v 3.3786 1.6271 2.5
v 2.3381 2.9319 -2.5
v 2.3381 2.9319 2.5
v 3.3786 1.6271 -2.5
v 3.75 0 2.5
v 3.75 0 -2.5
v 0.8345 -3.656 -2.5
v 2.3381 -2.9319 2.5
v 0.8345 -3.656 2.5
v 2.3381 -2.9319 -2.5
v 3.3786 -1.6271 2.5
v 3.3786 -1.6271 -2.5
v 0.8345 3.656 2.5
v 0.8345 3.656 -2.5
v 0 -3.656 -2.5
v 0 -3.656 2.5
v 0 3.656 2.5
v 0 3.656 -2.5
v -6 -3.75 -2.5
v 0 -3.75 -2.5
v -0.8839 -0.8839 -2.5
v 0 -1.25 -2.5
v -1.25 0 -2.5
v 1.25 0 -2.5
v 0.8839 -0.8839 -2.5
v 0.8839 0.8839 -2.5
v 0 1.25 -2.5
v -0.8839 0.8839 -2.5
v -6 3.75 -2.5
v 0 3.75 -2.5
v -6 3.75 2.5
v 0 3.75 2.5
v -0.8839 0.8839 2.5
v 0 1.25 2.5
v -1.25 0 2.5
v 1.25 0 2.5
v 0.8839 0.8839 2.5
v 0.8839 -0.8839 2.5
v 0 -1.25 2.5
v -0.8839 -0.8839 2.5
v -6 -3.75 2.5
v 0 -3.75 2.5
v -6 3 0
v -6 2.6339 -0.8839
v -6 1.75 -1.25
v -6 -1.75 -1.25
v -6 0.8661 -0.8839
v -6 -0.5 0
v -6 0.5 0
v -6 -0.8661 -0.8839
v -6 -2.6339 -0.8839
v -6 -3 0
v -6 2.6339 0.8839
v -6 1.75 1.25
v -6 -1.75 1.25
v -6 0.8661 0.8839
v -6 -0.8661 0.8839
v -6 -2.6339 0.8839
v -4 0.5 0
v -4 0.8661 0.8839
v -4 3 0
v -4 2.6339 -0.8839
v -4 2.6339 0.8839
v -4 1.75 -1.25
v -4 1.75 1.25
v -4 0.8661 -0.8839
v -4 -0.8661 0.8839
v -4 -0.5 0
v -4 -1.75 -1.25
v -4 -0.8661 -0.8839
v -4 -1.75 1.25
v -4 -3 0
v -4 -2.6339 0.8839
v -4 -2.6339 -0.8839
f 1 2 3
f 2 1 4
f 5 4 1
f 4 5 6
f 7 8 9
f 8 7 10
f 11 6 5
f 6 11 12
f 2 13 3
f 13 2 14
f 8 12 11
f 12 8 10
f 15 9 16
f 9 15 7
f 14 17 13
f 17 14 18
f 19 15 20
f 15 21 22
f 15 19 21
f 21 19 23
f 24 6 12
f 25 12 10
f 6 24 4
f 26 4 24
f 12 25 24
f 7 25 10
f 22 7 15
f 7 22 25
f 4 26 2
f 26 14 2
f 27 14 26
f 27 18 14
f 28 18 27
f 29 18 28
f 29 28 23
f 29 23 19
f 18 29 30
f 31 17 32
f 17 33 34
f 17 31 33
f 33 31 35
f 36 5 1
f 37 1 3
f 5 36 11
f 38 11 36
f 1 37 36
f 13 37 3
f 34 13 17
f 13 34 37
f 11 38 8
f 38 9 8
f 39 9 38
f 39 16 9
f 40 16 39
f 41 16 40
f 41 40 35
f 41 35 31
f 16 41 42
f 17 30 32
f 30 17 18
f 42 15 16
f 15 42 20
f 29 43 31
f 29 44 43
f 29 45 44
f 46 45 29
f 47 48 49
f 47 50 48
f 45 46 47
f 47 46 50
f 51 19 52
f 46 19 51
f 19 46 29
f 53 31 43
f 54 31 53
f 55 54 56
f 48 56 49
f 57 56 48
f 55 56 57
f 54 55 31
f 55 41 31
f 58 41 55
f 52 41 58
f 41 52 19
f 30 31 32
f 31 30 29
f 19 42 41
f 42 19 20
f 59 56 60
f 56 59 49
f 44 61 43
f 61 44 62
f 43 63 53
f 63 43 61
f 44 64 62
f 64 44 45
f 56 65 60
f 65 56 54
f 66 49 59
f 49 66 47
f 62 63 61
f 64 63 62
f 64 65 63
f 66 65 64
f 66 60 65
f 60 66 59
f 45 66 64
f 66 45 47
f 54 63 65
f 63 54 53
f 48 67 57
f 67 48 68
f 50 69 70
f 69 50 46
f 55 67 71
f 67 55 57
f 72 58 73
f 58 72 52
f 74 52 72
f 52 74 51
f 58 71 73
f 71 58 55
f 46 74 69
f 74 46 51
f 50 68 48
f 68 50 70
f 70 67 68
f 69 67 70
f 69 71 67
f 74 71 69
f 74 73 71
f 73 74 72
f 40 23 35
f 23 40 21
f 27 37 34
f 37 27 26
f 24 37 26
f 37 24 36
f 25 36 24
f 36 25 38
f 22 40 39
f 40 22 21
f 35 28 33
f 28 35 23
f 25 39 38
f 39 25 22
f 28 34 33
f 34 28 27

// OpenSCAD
// file: ../motors/MN5212.scad
use <../utils.scad>

module MN5212(){

	render(){
		translate([0,0, 42.5 / 2 - 23 / 2 - 4.9 - 6])
			cylinder(
				h = 23,
				r = 59 / 2,
				$fa = fa(59 / 2),
				center = true);
		translate([0,0, 42.5 / 2 - 4.9 / 2 - 6])
			cylinder(
				h = 4.9,
				r1 = 59 / 2,
				r2 = 24.8 / 2,
				$fa = fa(59 / 2),
				center = true);
		translate([0,0, - 42.5 / 2 + 5.6 / 2 + 3])
			cylinder(
				h = 5.6,
				r1 = 44 / 2,
				r2 = 59 / 2,
				$fa = fa(59 / 2),
				center = true);
		translate([0, 0, 42.5 / 2 - 3])
			cylinder(
				h = 6,
				r = 4 / 2,
				$fa = fa(4 / 2),
				center = true);
		translate([0, 0, - 42.5 / 2 + 1.5])
			cylinder(
				h = 3,
				r = 6 / 2,
				$fa = fa(6 / 2),
				center = true);
	}

}
// file: ../servos/HS_5065MG.scad
use <../utils.scad>

module HS_5065MG(){

	length = 23.75;
	width = 11.68;
	depth = 20.32;
	wing_width = 32.38;
	wing_thick = 3.43;
	shaft_offset = 6;
	hole_spacing = 28.32;
	shaft_height = 26.16;
	shaft_length = 2;

	module mounting_hole(){
		mh_rad = 2 / 2;
		translate(
			[
				hole_spacing / 2,
				0,
				depth / 2 - wing_thick / 2
			])
			cylinder(h = 5, r = mh_rad, $fa = fa(mh_rad), center = true);
	}

	difference(){
		union(){
			cube([length, width, depth], center = true);
			translate([0, 0, depth / 2 - wing_thick / 2])
				cube([wing_width, width, wing_thick], center = true);
			translate(
				[
					- length / 2 + shaft_offset,
					0,
					shaft_height - length / 2 + shaft_length / 2
				])
				cylinder(
					h = shaft_length,
					r = 1.5,
					$fa = fa(1.5),
					center = true);
		}	union(){

			mounting_hole();
			mirror() mounting_hole();
		}
	}
}

HS_5065MG();
// file: ../servos/LS_0006_servo.scad
// Author Michael Marques (DrYerzinia)

use <../utils.scad>

module ls_0006_servo(){
	
	length = 21.4;
	depth = 19.9;
	thickness = 11.65;

	gear_height = 2.6;
	gear_bump_height = 0.7;
	gear_bump_diameter = 1.97;
	gear_outer_bump_diameter = 6;
	gear_bump_offset = 12.2;

	shaft_height = 2.4;
	shaft_diameter = 3.74;
	shaft_offset = thickness / 2;
	shaft_screw_diameter = 1.3;
	
	wing_outer_width = 8.5;
	wing_top_off = 3.8;
	wing_length = 3.8;
	wing_thickness = 1.2;
	wing_hole_diameter = 1.85;
	wing_hole_edge_dist = 2;

	module wing_hole(){
		translate(
			[
				length / 2 + wing_hole_edge_dist,
				0,
				depth/2 - wing_top_off - wing_thickness / 2
			])
			cylinder(
				h = wing_thickness + 1,
				r = wing_hole_diameter / 2,
				$fn = 16,
				center = true);
	}

	module wing(){
		translate(
			[
				length / 2,
				thickness / 2,
				depth/2 - wing_top_off - wing_thickness
			])
			rotate([0,0,-90])
				trapezoid(
					thickness,
					wing_outer_width,
					wing_length,
					wing_thickness);
	}

	// Body
	cube([length, thickness, depth], center = true);

	difference(){
		union(){

			wing();
			mirror() wing();

			// Gear Bumps
			translate([0, 0, depth/2 + gear_height / 2]){
				translate([length / 2 - gear_bump_offset, 0, 0])
					cylinder(
						h = gear_height,
						r = gear_outer_bump_diameter / 2,
						$fn = 16,
						center = true);
				translate([length / 2 - gear_bump_offset, 0, gear_height/2 + gear_bump_height / 2])
					cylinder(
						h = gear_bump_height,
						r = gear_bump_diameter / 2,
						$fn = 16,
						center = true);
				translate([length / 2 - shaft_offset, 0, 0])
					cylinder(
						h = gear_height,
						r = thickness / 2,
						$fn = 32,
						center = true);
				// Shaft
				translate([length / 2 - shaft_offset, 0, gear_height])
					cylinder(
						h = shaft_height,
						r = shaft_diameter / 2,
						$fn = 16,
						center = true);
			}

		}
		union(){

			wing_hole();
			mirror() wing_hole();

			// Shaft_hole
			translate(
				[
					length / 2 - shaft_offset,
					0,
					depth/2 + gear_height * (3 / 2) + 0.5])
				cylinder(
					h = shaft_height + 1,
					r = shaft_screw_diameter / 2,
					$fn = 16,
					center = true);

		}
	}

}

module translate_ls_0006_attachment(){

	length = 21.4;
	thickness = 11.65;
	shaft_offset = thickness / 2;
	depth = 19.9;
	float = 3.3;

	translate([length / 2 - shaft_offset, 0, depth / 2 + float])
		children();

}

module bar_attachment(){

	height = 3.75;
	bar_length = 14.7;
	bar_thickness = 1.6;
	inner_radius = 5.9;
	outer_radius = 3.95;
	shaft_diameter = 3.7;
	upper_void_diameter = 4.8;
	screw_diameter = 2;
	hole_spacing = 2;
	hole_4_diameter = 1.2;
	hole_diameter = 1;
	hole_start_off = 4.7;
	top_void_depth = 0.67;
	bottom_void_depth = 1.84;

	translate([0, 0, height / 2]){
		difference(){
			union(){

				translate([0, inner_radius / 2, height / 2 - bar_thickness])
					rotate([0,0,-90])
						trapezoid(
							inner_radius,
							outer_radius,
							bar_length,
							bar_thickness);

				cylinder(
					h = height,
					r = inner_radius / 2,
					$fn = 16,
					center = true);

				translate([bar_length, 0, height / 2 - bar_thickness / 2])
					cylinder(
						h = bar_thickness,
						r = outer_radius / 2,
						$fn = 16,
						center = true);

			}
			union(){
				// screwhole
				cylinder(
					h = height + 1,
					r = screw_diameter / 2,
					$fn = 16,
					center = true);
				// voids
				translate([0, 0, height / 2 - top_void_depth / 2 + 0.5])
					cylinder(
						h = top_void_depth + 1,
						r = upper_void_diameter / 2,
						$fn = 16,
						center = true);
				translate([0, 0,  - bottom_void_depth / 2 - 0.5])
					cylinder(
						h = bottom_void_depth + 1,
						r = shaft_diameter / 2,
						$fn = 16,
						center = true);

				for(i = [0:4]){
					dia = (i != 3) ? hole_diameter : hole_4_diameter;
					translate(
						[
							hole_start_off + hole_spacing * i,
							0,
							height / 2 - bar_thickness / 2])
						cylinder(
							h = bar_thickness + 1,
							r = dia / 2,
							$fn = 16,
							center = true);
				}

			}
		}
	}

}

ls_0006_servo();
translate_ls_0006_attachment() bar_attachment();
// file: ../servos/parallax_continuous_rotation_servo.scad
// Author Michael Marques (DrYerzinia)

module parallax_continuous_rotation_servo(){

	depth = 37.7;
	length = 40.75;
	width = 19.75;

	mount_height = 2.7;
	mount_extent = 6.1;
	mount_from_top = 7.7;

	mount_hole_diameter = 4.46;
	mount_hole_spacing = 14.4 - mount_hole_diameter;

	shaft_diameter = 5.8;
	shaft_offset = 10;
	shaft_length = 3.5;

	module mounting_hole(){

			translate(
				[
					length / 2 + 5,
					mount_hole_spacing / 2,
					depth / 2 - mount_height / 2 - mount_from_top
				]
				)
				cylinder(
					h = mount_height + 1,
					r = mount_hole_diameter / 2,
					$fn=16,
					center = true);
	}

	difference(){
		union(){

			// Body
			cube([length,width,depth], center = true);

			// Mounting wings
			translate(
				[
					0,
					0,
					depth / 2 - mount_height / 2 - mount_from_top
				])
				cube(
					[
						length + mount_extent * 2,
						width,
						mount_height
					],
					center = true);

			// Shaft
			translate(
				[
					length / 2 - shaft_offset,
					0,
					depth / 2 + shaft_length / 2
				]
				)
				cylinder(
					h = shaft_length,
					r = shaft_diameter / 2,
					$fn = 16,
					center = true
				);

		}
		union(){

			// Mounting Holes
			mounting_hole();
			mirror()
				mounting_hole();

			translate([0,-mount_hole_spacing,0]){
				mounting_hole();
				mirror()
					mounting_hole();
			}
		}
	}

}

module translate_shaft(){

	depth = 37.7;
	length = 40.75;

	shaft_offset = 10;

	translate(
		[
			length / 2 - shaft_offset,
			0,
			depth / 2
		])
		children();
}

module round_servo_attachment(){

	height = 6;
	diameter = 20.8;
	inner_diameter = 8.6;
	plate_thickness = 2.45;

	float = 2;

	depth = 37.7;
	length = 40.75;

	shaft_offset = 10;

	plate_hole_spacing = 14.5;
	plate_hole_diameter = 1.4;
	plate_hole_minor_spacing = 3.5;

	screw_hole_diameter = 3;

	inner_diameter = 8;
	
	top_depth = 1.8;
	bottom_depth = 3.4;

	void_diameter = 5.8;

	module plate_hole(){
		cylinder(
			h = plate_thickness + 1,
			r = plate_hole_diameter / 2,
			$fn = 16,
			center = true
		);
	}

	module plate_hole_group(){
		translate([0, 0, height / 2 - plate_thickness / 2]){
			translate([0, plate_hole_spacing / 2, 0]){
					plate_hole();
					translate([- plate_hole_minor_spacing, 0, 0])
						plate_hole();
					translate([  plate_hole_minor_spacing, 0, 0])
						plate_hole();
			}
		}
	}

	translate(
		[
			length / 2 - shaft_offset,
			0,
			depth / 2 + height / 2 + float
		]
		)
		difference(){

			union(){

				// inner shaft
				cylinder(
					h = height,
					r = inner_diameter / 2,
					$fn = 16,
					center = true
				);

				// top
				translate([0, 0, height / 2 - plate_thickness / 2])
					cylinder(
						h = plate_thickness,
						r = diameter / 2,
						$fn = 32,
						center = true
					);
			}

			union(){

				// plate holes
				for(ang = [0:3]){
					rotate([0,0, ang * 90])
						plate_hole_group();
				}

				// screw hole
				cylinder(
					h = height + 1,
					r = screw_hole_diameter / 2,
					$fn = 16,
					center = true
				);

				// inner voids
				translate([0, 0, height / 2 - top_depth / 2 + 1])
					cylinder(
						h = top_depth + 1,
						r = void_diameter / 2,
						$fn = 16,
						center = true
					);
				translate([0, 0, -1])
					cylinder(
						h = bottom_depth + 1,
						r = void_diameter / 2,
						$fn = 16,
						center = true
					);

			}

		}

}

parallax_continuous_rotation_servo();
round_servo_attachment();
// file: ../hardware.scad
 // Author Michael Marques (DrYerzinia)

// http://www.ebay.com/itm/10-PCS-683-3x7x2-mm-Metal-OPEN-PRECISION-Miniature-Ball-Bearing-3-7-2-/291206307942?hash=item43cd3fa066:m:mCi6eovrGVk_CjIUjlhw8yg
// E-Bay empire.rc

module washer_M3_7x3_2x0_5mm(){

	difference(){
		cylinder(
			h = 0.5,
			r = 7 / 2,
			$fn = 16,
			center = true);
		cylinder(
			h = 0.5 + 0.1,
			r = 3.2 / 2,
			$fn = 16,
			center = true);
	}

}

module bearing_3x7x2mm(){

	difference(){
		cylinder(
			h = 2,
			r = 7 / 2,
			$fn = 16,
			center = true);
		cylinder(
			h = 2 + 1,
			r = 3 / 2,
			$fn = 16,
			center = true);
	}

}

module bearing_5x8x2_5mm(){

	difference(){
		cylinder(
			h = 2.5,
			r = 8 / 2,
			$fn = 16,
			center = true);
		cylinder(
			h = 2.5 + 1,
			r = 5 / 2,
			$fn = 16,
			center = true);
	}

}

module bearing_8x16x5mm(){

	difference(){
		cylinder(
			h = 5,
			r = 16 / 2,
			$fn = 16,
			center = true);
		cylinder(
			h = 5 + 1,
			r = 8 / 2,
			$fn = 16,
			center = true);
	}

}


bearing_5x8x2_5mm();
// file: ../utils.scad
// http://forum.openscad.org/Creating-pie-pizza-slice-shape-need-a-dynamic-length-array-td3148.html

module pie_slice(r, start_angle, end_angle) {
    R = r * sqrt(2) + 1;
    a0 = (4 * start_angle + 0 * end_angle) / 4;
    a1 = (3 * start_angle + 1 * end_angle) / 4;
    a2 = (2 * start_angle + 2 * end_angle) / 4;
    a3 = (1 * start_angle + 3 * end_angle) / 4;
    a4 = (0 * start_angle + 4 * end_angle) / 4;
    if(end_angle > start_angle)
        intersection() {
        circle(r, $fa = fa(r));
        polygon([
            [0,0],
            [R * cos(a0), R * sin(a0)],
            [R * cos(a1), R * sin(a1)],
            [R * cos(a2), R * sin(a2)],
            [R * cos(a3), R * sin(a3)],
            [R * cos(a4), R * sin(a4)],
            [0,0]
       ]);
    }
}

// https://github.com/openscad/openscad/issues/29

module rotate_about(v,a) {
	translate(v) rotate(a) translate(-v) children(0);
}

module rotate_about_axis(v, ang, axis) {
	translate(v) rotate(ang, axis) translate(-v) children(0);
}

// https://github.com/robofun/openscad-utils/blob/master/trapezoid.scad

module trapezoid(width_base, width_top,height,thickness) {
	

  linear_extrude(height = thickness) polygon(points=[[0,0],[width_base,0],[width_base-(width_base-width_top)/2,height],[(width_base-width_top)/2,height]], paths=[[0,1,2,3]]); 
  
}

// http://forum.openscad.org/fe-Tolerance-based-arc-approximation-td14212.html

function fa(r)=($fn>0)?360/$fn:($fe>0)?($fe<r)?min(45,2*acos(1-$fe/r)):45:$fa; 
// file: ../render_settings.scad
// Author Michael Marques (DrYerzinia)

// Lulzbot Mini tolerances
// x/y 0.1mm
// z   0.05mm
//
// 0.1mm   preview tolerance
// 0.025mm export  tolerance

$fs = 0.01;
$fn = undef;
$fa = 360 / 5;

$fe = 0.025;	// export
// main file
// Author Michael Marques (DrYerzinia)

include <../render_settings.scad>

use <../BB8.scad>

Door_P9_cover_slide_hinge();
